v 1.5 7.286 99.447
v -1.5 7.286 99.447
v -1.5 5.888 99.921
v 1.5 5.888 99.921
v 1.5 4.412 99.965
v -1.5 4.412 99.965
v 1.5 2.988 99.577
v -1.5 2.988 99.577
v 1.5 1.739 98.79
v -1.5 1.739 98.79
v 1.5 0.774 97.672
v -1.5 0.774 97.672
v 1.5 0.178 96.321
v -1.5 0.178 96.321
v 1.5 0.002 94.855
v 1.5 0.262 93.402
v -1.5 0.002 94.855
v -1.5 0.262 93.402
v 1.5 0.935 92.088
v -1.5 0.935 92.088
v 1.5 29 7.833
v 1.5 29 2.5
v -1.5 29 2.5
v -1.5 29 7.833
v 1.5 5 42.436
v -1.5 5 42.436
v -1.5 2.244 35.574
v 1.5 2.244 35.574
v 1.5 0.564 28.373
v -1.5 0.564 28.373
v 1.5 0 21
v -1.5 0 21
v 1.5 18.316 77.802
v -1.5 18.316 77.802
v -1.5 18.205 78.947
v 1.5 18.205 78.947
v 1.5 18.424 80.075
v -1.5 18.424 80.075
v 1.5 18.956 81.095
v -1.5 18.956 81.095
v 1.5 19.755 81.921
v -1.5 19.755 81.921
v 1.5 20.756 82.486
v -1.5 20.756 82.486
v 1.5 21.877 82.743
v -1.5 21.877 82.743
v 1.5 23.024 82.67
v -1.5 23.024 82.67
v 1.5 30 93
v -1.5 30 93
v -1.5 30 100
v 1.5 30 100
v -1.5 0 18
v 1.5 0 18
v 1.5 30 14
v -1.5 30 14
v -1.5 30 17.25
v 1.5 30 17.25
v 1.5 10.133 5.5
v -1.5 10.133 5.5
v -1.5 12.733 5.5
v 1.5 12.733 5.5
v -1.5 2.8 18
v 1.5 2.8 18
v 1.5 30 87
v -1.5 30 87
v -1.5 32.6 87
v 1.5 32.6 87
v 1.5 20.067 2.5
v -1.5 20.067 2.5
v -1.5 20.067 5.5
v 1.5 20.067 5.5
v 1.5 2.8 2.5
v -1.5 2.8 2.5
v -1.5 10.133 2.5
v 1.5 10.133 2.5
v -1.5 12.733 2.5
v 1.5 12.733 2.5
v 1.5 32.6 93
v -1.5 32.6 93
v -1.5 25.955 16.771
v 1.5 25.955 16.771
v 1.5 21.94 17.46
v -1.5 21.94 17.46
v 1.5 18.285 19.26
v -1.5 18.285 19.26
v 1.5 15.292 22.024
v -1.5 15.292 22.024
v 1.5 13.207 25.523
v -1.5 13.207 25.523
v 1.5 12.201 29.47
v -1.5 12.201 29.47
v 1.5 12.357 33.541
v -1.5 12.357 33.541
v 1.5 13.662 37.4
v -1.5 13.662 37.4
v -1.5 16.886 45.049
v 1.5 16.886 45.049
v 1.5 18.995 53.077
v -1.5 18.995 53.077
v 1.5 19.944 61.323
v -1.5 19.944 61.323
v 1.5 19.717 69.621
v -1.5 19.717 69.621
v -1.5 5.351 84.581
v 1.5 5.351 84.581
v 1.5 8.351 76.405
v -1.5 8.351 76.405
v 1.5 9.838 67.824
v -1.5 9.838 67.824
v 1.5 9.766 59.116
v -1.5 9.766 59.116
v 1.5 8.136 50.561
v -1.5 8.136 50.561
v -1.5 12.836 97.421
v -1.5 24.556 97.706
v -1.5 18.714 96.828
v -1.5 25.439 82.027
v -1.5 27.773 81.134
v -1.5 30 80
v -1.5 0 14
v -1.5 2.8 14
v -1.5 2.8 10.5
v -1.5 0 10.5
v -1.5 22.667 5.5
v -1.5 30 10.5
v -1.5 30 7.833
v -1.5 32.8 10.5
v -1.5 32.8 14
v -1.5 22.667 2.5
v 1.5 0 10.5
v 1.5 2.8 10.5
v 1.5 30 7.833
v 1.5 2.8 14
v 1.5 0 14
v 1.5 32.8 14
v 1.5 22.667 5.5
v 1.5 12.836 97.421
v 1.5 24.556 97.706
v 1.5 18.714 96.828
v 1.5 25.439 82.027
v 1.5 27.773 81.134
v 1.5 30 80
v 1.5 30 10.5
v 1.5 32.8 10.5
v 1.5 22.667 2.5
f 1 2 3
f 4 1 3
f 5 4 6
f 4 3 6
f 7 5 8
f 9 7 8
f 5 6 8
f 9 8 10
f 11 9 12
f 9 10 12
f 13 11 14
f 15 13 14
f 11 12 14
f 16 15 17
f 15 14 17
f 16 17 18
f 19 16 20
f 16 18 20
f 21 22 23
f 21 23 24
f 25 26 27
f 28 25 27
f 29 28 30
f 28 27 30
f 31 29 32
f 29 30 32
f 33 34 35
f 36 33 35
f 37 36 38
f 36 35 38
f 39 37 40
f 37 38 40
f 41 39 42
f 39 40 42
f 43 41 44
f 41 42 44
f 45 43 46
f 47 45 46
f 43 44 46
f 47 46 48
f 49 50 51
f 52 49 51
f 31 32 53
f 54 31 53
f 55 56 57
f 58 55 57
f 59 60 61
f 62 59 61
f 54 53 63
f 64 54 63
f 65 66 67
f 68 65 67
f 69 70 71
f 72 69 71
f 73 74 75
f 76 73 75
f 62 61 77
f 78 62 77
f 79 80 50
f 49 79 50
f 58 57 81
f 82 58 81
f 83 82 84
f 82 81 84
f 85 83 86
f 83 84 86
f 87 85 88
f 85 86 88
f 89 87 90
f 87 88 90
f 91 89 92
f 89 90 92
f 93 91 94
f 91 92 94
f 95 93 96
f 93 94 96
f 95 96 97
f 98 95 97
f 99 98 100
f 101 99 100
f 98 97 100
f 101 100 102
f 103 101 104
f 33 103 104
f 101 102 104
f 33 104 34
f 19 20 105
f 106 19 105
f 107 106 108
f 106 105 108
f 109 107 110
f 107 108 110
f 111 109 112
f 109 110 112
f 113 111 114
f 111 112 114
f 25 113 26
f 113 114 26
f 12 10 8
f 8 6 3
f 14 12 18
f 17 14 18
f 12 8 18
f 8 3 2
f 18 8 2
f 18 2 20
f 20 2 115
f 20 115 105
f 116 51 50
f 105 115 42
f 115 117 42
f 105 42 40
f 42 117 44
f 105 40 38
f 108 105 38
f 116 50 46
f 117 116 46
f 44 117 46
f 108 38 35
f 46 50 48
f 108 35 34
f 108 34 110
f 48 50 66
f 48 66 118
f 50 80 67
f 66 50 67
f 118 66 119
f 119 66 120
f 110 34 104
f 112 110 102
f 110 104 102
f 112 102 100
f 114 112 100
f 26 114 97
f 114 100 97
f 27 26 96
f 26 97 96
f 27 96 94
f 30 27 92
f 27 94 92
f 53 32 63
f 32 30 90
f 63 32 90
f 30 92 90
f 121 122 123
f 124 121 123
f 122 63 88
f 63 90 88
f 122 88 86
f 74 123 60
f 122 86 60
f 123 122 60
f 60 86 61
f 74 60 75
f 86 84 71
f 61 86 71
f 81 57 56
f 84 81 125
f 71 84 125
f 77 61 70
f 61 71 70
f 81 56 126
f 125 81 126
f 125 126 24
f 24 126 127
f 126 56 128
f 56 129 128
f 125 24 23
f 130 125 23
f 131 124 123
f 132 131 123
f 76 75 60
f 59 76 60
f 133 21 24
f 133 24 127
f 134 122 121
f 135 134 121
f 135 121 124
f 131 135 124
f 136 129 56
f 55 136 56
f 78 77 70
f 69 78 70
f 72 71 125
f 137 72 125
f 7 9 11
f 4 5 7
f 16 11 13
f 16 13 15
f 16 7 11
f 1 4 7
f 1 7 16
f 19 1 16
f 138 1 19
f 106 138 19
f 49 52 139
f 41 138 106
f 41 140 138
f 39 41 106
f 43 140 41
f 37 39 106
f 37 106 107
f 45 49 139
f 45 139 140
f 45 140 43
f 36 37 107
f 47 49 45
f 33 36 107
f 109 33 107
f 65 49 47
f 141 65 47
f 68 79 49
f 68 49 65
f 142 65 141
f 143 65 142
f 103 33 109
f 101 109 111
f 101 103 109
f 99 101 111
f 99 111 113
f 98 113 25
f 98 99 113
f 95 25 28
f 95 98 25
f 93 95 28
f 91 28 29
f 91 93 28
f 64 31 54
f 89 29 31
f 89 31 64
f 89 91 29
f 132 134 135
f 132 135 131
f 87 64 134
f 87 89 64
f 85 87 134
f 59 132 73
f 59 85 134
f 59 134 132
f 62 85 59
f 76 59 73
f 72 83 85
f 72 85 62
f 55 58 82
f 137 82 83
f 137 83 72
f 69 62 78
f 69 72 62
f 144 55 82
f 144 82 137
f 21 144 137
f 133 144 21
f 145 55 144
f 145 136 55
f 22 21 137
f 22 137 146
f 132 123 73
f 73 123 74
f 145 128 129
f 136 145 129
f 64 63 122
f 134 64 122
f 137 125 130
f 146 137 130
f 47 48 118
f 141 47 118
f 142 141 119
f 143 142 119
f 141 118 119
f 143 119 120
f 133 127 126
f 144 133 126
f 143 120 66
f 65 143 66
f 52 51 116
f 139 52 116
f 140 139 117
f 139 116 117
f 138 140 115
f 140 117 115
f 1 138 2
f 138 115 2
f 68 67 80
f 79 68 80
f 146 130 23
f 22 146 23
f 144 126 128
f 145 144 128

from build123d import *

# Parameters (mm, degrees)
BOSS_EXTRUDE1_DEPTH      = 1.5
BOSS_EXTRUDE1_DEPTH_BACK = 1.5
CUT_EXTRUDE1_DEPTH       = 106.28456677


with BuildPart() as part:
    # Sketch1 → Boss-Extrude1 (new, two sides: drawn at the far end of the back side and taken through both)
    with BuildSketch(Plane(origin=(0, 0, 0), x_dir=(0, 0, -1), z_dir=(1, 0, 0)).offset(-BOSS_EXTRUDE1_DEPTH_BACK)):
        with BuildLine():
            Line((-80, 30), (-87, 30))
            Line((-87, 30), (-87, 32.6))
            Line((-87, 32.6), (-93, 32.6))
            Line((-93, 32.6), (-93, 30))
            Line((-93, 30), (-100, 30))
            ThreePointArc((-100, 30), (-96.828033965, 18.713629613), (-99.446714265, 7.28620477))
            ThreePointArc((-99.446714265, 7.28620477), (-98.266775294, 1.214741861), (-92.088027506, 0.935468515))
            ThreePointArc((-92.088027506, 0.935468515), (-67.824329395, 9.838481267), (-42.435753596, 5))
            ThreePointArc((-42.435753596, 5), (-32.005584176, 1.266555107), (-21, 0))
            Line((-21, 0), (-18, 0))
            Line((-18, 0), (-18, 2.8))
            Line((-18, 2.8), (-14, 2.8))
            Line((-14, 2.8), (-14, 0))
            Line((-14, 0), (-10.5, 0))
            Line((-10.5, 0), (-10.5, 2.8))
            Line((-10.5, 2.8), (-2.5, 2.8))
            Line((-2.5, 2.8), (-2.5, 10.133333333))
            Line((-2.5, 10.133333333), (-5.5, 10.133333333))
            Line((-5.5, 10.133333333), (-5.5, 12.733333333))
            Line((-5.5, 12.733333333), (-2.5, 12.733333333))
            Line((-2.5, 12.733333333), (-2.5, 20.066666667))
            Line((-2.5, 20.066666667), (-5.5, 20.066666667))
            Line((-5.5, 20.066666667), (-5.5, 22.666666667))
            Line((-5.5, 22.666666667), (-2.5, 22.666666667))
            Line((-2.5, 22.666666667), (-2.5, 30))
            Line((-2.5, 30), (-10.5, 30))
            Line((-10.5, 30), (-10.5, 32.8))
            Line((-10.5, 32.8), (-14, 32.8))
            Line((-14, 32.8), (-14, 30))
            Line((-14, 30), (-17.249742261, 30))
            ThreePointArc((-17.249742261, 30), (-22.023510763, 15.292477496), (-37.40016873, 13.661994841))
            ThreePointArc((-37.40016873, 13.661994841), (-57.183488606, 19.61610248), (-77.802405966, 18.315567968))
            ThreePointArc((-77.802405966, 18.315567968), (-81.536934186, 19.325375212), (-82.669963788, 23.024382595))
            ThreePointArc((-82.669963788, 23.024382595), (-81.611172702, 26.61790516), (-80, 30))
        make_face()
    extrude(amount=BOSS_EXTRUDE1_DEPTH + BOSS_EXTRUDE1_DEPTH_BACK)

    # Sketch2 → Cut-Extrude1 (cut, through all)
    with BuildSketch(Plane(origin=(1.5, 0, 0), x_dir=(0, 0, -1), z_dir=(1, 0, 0))):
        Polygon((-7.833333333, 30), (-5.166666667, 30), (-2.5, 30), (-2.5, 29), (-7.833333333, 29), align=None)
    extrude(amount=-CUT_EXTRUDE1_DEPTH, mode=Mode.SUBTRACT)


solid = part.part
